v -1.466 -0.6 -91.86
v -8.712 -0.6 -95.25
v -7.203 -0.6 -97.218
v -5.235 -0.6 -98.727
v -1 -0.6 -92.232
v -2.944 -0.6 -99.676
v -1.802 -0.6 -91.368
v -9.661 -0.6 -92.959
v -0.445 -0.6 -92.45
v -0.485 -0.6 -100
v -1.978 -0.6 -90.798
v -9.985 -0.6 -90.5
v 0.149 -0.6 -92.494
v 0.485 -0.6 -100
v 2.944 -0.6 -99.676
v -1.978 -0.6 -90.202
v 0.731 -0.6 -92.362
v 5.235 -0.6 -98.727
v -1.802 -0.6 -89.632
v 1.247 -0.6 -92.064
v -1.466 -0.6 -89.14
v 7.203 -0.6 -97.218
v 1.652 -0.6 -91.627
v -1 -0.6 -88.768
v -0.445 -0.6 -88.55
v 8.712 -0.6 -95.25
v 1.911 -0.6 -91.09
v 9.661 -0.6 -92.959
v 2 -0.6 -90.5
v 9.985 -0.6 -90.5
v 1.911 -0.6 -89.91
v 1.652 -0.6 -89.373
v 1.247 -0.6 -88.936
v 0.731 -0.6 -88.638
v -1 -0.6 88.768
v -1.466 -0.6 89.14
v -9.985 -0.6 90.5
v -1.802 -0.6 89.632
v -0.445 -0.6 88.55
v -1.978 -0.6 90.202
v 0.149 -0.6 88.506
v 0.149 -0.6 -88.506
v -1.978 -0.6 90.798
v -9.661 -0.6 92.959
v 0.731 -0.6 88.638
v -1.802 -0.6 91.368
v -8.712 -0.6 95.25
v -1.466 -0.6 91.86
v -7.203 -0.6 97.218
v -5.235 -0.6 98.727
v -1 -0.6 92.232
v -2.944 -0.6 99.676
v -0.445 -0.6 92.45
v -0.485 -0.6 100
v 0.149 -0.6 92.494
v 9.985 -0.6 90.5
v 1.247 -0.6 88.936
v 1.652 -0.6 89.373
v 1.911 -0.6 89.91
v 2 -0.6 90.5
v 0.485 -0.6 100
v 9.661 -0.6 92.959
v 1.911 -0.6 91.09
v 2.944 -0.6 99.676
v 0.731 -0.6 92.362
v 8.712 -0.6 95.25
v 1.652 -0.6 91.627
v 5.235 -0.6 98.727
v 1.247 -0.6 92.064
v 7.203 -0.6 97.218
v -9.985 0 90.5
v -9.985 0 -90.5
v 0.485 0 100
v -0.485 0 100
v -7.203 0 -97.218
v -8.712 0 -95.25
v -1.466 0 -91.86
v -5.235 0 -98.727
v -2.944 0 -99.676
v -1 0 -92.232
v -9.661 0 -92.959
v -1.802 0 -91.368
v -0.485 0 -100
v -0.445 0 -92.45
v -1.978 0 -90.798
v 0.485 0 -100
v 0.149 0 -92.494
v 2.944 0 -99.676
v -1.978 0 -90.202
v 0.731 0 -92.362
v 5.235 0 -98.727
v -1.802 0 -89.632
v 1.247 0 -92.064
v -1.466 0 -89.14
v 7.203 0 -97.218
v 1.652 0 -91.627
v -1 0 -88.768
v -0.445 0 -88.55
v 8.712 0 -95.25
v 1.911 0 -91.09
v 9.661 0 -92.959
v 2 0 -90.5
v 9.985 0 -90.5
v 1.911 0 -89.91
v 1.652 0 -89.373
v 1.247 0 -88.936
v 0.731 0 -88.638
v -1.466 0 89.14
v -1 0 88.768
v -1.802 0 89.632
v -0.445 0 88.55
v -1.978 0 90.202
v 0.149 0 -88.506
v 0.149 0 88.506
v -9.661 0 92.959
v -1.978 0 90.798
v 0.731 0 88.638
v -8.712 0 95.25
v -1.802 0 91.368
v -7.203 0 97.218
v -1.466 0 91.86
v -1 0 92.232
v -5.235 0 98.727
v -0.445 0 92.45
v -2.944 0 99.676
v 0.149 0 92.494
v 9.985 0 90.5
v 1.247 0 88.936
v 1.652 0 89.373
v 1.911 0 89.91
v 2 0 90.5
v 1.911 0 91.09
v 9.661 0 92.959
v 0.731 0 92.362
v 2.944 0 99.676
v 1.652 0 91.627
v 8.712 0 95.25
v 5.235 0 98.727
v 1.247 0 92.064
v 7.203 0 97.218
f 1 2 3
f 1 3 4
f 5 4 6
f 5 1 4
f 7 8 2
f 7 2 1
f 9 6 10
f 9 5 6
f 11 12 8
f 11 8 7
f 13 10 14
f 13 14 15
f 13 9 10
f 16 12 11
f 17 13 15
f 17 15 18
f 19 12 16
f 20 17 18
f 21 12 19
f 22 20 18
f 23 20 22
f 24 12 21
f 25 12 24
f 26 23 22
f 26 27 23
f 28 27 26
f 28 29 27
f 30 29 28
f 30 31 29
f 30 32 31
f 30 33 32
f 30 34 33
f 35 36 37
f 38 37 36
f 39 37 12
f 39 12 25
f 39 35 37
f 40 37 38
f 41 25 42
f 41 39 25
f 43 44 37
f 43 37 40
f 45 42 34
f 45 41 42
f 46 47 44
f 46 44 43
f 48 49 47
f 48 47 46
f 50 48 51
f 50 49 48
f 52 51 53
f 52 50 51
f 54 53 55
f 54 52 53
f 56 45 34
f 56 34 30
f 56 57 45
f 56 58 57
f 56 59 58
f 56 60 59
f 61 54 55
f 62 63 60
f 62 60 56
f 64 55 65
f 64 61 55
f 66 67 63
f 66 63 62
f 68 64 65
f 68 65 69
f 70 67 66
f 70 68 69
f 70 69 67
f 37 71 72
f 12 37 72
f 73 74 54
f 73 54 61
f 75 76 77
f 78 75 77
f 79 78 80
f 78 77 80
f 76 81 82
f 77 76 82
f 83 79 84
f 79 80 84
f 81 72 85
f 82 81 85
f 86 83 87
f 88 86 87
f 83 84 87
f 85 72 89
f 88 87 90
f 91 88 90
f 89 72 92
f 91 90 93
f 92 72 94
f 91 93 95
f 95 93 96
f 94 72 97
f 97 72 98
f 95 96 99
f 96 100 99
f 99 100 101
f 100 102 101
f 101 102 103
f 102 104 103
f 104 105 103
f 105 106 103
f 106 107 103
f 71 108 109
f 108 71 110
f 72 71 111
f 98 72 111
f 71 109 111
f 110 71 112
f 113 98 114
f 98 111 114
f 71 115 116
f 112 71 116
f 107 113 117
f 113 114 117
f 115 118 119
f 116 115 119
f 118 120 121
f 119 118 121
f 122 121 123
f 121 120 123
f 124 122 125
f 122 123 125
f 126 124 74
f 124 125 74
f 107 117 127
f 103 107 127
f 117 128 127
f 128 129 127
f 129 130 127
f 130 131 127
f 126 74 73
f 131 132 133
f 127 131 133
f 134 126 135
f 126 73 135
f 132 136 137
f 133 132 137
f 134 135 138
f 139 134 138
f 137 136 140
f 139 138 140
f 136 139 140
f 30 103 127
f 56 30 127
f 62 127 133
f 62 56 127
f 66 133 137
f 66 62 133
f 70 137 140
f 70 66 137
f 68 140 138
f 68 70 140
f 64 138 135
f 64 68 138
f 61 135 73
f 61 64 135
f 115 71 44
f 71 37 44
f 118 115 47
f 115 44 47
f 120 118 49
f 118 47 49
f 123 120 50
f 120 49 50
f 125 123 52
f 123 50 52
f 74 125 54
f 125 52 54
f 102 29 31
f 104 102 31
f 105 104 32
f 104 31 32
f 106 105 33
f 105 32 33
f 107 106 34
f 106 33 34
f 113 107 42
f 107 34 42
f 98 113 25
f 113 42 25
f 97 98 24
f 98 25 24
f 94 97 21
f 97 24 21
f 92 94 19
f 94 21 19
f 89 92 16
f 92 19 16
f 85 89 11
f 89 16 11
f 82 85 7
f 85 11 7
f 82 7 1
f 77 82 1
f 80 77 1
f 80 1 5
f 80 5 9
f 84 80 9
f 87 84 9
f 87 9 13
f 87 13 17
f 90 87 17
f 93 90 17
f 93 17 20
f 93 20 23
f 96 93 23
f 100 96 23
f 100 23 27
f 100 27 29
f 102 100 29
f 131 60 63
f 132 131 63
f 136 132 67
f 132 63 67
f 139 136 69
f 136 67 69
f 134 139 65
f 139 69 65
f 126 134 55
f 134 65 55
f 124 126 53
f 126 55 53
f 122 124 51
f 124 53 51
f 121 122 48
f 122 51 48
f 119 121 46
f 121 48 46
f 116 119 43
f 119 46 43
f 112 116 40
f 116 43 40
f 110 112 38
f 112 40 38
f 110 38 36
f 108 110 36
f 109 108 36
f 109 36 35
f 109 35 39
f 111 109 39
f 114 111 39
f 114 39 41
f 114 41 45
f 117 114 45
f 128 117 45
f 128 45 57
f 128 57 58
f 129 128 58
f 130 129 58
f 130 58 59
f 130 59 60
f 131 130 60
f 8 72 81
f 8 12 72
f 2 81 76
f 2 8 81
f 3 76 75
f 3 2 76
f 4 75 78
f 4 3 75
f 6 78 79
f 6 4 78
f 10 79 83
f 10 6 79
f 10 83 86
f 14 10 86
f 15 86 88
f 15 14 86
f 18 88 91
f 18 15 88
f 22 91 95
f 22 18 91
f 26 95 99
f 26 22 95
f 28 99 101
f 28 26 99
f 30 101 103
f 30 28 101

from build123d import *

# Parameters (mm, degrees)
F0_W     = 19.97
F0_H     = 100
F1_DEPTH = 0.6
F2_R     = 9.5
F3_R     = 2
F4_DEPTH = 0.601


with BuildPart() as f1:
    # F0 (on Front) → F1 (new body)
    with BuildSketch(Plane.XZ):
        with Locations((0, 50)):
            Rectangle(F0_W, F0_H)
        with Locations((0, -50)):
            Rectangle(F0_W, F0_H)
    extrude(amount=F1_DEPTH)

    # F2
    f2_edges = [f1.edges().sort_by_distance(p)[0] for p in [
        (9.985, -0.3, 100),
        (-9.985, -0.3, 100),
        (9.985, -0.3, -100),
        (-9.985, -0.3, -100),
    ]]
    fillet(f2_edges, radius=F2_R)

    # F3 (on face) → F4 (cut, through all)
    with BuildSketch(Plane.XZ.offset(0.6)):
        with Locations((0, 90.5)):
            Circle(F3_R)
        with Locations((0, -90.5)):
            Circle(F3_R)
    extrude(amount=-F4_DEPTH, mode=Mode.SUBTRACT)


solid = f1.part
